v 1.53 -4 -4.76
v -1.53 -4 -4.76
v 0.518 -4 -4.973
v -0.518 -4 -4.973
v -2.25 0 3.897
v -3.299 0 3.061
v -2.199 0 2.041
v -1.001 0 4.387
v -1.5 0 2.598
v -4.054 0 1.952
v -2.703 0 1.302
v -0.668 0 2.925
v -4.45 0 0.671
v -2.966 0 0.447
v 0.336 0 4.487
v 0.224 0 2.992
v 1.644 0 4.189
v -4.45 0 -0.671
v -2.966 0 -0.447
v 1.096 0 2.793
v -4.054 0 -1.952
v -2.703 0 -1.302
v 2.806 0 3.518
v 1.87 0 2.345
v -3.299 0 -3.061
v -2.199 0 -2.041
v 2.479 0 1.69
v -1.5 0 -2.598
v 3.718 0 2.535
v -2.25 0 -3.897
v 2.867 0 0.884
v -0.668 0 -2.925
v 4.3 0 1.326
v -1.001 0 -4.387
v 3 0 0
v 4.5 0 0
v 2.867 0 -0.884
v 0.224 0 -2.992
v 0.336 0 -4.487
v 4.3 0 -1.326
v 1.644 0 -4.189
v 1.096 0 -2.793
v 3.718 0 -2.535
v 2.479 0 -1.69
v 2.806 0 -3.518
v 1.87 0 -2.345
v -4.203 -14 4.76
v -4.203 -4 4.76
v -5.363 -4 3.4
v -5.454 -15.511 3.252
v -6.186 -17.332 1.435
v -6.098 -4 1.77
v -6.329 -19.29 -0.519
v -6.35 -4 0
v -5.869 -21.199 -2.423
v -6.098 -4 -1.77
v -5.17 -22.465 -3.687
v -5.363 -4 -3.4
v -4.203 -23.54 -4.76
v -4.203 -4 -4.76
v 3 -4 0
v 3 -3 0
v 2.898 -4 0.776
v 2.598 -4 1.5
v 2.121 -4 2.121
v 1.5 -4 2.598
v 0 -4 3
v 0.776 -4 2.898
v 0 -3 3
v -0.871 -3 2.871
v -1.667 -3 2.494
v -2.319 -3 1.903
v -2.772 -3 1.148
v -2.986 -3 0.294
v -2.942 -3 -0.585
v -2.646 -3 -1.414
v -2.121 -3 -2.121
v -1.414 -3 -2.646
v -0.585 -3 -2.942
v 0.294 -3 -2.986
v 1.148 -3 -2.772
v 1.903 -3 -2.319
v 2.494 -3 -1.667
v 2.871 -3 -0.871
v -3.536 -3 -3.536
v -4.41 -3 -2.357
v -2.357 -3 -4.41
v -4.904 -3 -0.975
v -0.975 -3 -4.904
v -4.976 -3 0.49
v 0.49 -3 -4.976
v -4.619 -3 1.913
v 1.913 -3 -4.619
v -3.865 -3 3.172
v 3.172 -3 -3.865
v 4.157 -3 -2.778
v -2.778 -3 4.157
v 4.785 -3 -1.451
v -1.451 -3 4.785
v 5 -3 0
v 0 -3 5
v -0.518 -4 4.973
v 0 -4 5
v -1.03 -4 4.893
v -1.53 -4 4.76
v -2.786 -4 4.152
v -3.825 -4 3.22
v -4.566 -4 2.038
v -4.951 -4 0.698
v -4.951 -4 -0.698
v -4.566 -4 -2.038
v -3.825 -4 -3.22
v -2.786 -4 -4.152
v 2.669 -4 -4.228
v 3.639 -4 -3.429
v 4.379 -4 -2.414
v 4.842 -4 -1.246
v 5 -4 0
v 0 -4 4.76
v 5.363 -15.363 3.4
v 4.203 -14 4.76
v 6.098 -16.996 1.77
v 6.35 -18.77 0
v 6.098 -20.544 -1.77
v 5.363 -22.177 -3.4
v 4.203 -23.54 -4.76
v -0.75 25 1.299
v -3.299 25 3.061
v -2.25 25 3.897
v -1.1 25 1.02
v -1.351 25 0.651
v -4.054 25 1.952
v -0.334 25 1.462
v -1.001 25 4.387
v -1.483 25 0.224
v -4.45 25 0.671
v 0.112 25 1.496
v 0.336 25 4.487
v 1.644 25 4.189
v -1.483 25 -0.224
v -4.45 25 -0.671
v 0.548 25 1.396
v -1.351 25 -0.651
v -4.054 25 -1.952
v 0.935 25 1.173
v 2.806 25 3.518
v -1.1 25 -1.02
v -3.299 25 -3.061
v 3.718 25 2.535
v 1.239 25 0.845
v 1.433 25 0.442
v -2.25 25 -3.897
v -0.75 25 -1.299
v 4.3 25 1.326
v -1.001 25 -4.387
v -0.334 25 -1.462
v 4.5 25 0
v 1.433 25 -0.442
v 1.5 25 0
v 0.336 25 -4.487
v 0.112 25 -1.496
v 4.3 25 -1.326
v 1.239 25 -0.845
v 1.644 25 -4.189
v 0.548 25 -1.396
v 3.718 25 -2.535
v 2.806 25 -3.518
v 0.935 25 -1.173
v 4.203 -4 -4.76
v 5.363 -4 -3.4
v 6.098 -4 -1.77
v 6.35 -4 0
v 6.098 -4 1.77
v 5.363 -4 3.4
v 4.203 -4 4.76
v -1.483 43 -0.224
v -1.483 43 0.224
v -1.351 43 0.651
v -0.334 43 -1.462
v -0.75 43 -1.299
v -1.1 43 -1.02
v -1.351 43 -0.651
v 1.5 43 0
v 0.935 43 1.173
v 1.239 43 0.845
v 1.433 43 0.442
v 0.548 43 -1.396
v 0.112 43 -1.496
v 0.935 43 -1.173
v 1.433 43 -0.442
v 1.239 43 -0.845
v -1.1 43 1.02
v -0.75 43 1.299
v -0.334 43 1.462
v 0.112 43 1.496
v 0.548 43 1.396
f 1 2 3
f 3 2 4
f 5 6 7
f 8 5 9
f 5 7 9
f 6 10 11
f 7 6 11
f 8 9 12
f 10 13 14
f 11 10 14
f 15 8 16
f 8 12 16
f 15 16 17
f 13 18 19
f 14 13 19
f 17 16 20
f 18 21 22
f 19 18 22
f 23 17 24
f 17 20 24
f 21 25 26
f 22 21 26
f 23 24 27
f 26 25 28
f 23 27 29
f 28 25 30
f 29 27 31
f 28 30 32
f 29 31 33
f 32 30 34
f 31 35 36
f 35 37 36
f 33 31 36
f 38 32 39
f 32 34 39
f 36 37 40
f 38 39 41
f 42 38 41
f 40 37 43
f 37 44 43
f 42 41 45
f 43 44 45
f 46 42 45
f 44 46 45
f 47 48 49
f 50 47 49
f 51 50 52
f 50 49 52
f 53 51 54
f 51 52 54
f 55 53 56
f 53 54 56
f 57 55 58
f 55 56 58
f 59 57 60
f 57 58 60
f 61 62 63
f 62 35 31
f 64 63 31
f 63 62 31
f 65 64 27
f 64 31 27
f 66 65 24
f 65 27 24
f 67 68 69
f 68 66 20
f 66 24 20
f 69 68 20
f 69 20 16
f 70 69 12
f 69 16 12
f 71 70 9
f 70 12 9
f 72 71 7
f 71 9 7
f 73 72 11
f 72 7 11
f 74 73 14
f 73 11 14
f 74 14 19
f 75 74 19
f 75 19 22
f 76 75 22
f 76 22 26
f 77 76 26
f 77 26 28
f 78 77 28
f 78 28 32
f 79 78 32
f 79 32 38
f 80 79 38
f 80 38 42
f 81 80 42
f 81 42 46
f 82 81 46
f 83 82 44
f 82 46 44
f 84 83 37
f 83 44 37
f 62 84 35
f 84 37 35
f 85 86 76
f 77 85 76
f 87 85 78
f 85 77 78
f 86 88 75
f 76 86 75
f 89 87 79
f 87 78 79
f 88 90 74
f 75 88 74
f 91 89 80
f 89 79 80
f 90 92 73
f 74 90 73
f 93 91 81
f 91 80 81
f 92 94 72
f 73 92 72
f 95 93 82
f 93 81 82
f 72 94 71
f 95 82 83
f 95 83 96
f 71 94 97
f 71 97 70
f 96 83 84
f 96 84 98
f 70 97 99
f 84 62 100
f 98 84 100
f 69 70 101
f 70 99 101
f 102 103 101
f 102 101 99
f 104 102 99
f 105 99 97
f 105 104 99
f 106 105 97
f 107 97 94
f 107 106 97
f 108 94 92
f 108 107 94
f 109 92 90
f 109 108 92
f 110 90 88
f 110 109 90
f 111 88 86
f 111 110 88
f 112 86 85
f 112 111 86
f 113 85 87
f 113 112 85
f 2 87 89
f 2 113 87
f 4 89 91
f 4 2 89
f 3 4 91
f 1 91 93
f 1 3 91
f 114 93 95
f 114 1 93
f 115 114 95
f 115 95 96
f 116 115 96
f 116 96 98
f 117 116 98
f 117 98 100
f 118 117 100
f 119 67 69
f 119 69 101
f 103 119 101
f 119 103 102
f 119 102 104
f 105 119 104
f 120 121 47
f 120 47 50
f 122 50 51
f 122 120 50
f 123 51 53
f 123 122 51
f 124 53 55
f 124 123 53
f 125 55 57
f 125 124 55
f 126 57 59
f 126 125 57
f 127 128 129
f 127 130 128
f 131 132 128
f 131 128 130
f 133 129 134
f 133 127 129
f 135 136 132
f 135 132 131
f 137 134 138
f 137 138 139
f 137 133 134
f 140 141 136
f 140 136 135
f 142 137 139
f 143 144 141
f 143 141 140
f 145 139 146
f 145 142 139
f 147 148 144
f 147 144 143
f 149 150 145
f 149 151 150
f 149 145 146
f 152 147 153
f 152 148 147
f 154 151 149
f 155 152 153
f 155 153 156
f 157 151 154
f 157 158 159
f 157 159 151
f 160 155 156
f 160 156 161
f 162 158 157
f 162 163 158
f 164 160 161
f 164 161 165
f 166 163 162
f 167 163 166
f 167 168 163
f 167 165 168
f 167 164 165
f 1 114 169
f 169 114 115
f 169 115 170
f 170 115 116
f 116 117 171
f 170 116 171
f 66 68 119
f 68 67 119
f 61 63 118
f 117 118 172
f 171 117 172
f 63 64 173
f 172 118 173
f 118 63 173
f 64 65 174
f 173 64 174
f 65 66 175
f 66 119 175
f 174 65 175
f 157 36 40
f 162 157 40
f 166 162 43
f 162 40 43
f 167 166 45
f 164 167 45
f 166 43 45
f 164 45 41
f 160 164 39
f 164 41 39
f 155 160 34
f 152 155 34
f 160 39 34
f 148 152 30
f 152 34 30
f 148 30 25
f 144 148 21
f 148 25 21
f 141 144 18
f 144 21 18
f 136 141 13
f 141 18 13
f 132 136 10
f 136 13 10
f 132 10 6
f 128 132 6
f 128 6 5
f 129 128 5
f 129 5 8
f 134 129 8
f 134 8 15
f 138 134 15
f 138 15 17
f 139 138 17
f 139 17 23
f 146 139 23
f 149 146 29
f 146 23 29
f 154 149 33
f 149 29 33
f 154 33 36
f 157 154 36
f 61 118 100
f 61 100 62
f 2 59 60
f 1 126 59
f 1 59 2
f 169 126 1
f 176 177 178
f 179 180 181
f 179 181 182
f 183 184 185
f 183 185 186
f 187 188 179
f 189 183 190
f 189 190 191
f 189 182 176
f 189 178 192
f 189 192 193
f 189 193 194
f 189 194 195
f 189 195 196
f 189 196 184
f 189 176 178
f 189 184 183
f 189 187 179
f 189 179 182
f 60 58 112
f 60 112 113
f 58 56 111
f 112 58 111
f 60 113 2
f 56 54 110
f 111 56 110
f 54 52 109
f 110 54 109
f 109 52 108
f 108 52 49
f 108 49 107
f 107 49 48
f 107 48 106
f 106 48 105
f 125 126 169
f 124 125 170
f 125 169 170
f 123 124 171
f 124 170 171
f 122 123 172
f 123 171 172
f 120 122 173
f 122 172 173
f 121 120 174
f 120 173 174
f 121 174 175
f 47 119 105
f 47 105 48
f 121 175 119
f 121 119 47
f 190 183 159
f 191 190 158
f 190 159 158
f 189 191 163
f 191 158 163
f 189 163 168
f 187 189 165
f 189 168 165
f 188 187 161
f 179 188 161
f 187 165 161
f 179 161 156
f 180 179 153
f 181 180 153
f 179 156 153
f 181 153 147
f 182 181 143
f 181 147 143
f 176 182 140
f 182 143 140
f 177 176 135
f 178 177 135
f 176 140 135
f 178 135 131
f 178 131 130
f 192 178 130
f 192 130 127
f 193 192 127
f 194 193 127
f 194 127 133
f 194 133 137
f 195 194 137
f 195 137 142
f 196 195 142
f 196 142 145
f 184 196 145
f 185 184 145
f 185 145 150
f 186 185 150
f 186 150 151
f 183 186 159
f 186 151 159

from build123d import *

# Parameters (mm, degrees)
SKETCH1_R           = 4.5
BOSS_EXTRUDE1_DEPTH = 25
SKETCH2_R           = 3
BOSS_EXTRUDE2_DEPTH = 4
BOSS_EXTRUDE3_DEPTH = 1
SKETCH4_R           = 6.35
BOSS_EXTRUDE4_DEPTH = 19.54
CUT_EXTRUDE1_DEPTH  = 19.54
SKETCH7_R           = 1.5
BOSS_EXTRUDE5_DEPTH = 18


with BuildPart() as part:
    # Sketch1 → Boss-Extrude1 (new body)
    with BuildSketch(Plane(origin=(0, 0, 0), x_dir=(1, 0, 0), z_dir=(0, 1, 0))):
        Circle(SKETCH1_R)
    extrude(amount=BOSS_EXTRUDE1_DEPTH)

    # Sketch2 → Boss-Extrude2 (add)
    with BuildSketch(Plane.XZ):
        Circle(SKETCH2_R)
    extrude(amount=BOSS_EXTRUDE2_DEPTH)

    # Sketch3 → Boss-Extrude3 (add)
    with BuildSketch(Plane.XZ.offset(4)):
        with BuildLine():
            Line((0, 3), (0, 5))
            ThreePointArc((0, 5), (-3.535533906, -3.535533906), (5, 0))
            Line((5, 0), (3, 0))
            ThreePointArc((3, 0), (-2.121320344, -2.121320344), (0, 3))
        make_face()
    extrude(amount=-BOSS_EXTRUDE3_DEPTH)

    # Sketch4 → Boss-Extrude4 (add)
    with BuildSketch(Plane.XZ.offset(4)):
        Circle(SKETCH4_R)
    extrude(amount=BOSS_EXTRUDE4_DEPTH)

    # Sketch6 → Cut-Extrude1 (cut)
    with BuildSketch(Plane(origin=(6.35, 0, 0), x_dir=(0, 0, -1), z_dir=(1, 0, 0))):
        Polygon((-8.967576024, -4), (-4.76, -4), (-4.76, -14), (4.76, -23.54), (4.76, -4), (8.459767383, -4), (8.459767383, -27.476657102), (-8.967576024, -27.476657102), align=None)
    extrude(amount=-CUT_EXTRUDE1_DEPTH, mode=Mode.SUBTRACT)

    # Sketch7 → Boss-Extrude5 (add)
    with BuildSketch(Plane(origin=(0, 25, 0), x_dir=(1, 0, 0), z_dir=(0, 1, 0))):
        Circle(SKETCH7_R)
    extrude(amount=BOSS_EXTRUDE5_DEPTH)


solid = part.part
